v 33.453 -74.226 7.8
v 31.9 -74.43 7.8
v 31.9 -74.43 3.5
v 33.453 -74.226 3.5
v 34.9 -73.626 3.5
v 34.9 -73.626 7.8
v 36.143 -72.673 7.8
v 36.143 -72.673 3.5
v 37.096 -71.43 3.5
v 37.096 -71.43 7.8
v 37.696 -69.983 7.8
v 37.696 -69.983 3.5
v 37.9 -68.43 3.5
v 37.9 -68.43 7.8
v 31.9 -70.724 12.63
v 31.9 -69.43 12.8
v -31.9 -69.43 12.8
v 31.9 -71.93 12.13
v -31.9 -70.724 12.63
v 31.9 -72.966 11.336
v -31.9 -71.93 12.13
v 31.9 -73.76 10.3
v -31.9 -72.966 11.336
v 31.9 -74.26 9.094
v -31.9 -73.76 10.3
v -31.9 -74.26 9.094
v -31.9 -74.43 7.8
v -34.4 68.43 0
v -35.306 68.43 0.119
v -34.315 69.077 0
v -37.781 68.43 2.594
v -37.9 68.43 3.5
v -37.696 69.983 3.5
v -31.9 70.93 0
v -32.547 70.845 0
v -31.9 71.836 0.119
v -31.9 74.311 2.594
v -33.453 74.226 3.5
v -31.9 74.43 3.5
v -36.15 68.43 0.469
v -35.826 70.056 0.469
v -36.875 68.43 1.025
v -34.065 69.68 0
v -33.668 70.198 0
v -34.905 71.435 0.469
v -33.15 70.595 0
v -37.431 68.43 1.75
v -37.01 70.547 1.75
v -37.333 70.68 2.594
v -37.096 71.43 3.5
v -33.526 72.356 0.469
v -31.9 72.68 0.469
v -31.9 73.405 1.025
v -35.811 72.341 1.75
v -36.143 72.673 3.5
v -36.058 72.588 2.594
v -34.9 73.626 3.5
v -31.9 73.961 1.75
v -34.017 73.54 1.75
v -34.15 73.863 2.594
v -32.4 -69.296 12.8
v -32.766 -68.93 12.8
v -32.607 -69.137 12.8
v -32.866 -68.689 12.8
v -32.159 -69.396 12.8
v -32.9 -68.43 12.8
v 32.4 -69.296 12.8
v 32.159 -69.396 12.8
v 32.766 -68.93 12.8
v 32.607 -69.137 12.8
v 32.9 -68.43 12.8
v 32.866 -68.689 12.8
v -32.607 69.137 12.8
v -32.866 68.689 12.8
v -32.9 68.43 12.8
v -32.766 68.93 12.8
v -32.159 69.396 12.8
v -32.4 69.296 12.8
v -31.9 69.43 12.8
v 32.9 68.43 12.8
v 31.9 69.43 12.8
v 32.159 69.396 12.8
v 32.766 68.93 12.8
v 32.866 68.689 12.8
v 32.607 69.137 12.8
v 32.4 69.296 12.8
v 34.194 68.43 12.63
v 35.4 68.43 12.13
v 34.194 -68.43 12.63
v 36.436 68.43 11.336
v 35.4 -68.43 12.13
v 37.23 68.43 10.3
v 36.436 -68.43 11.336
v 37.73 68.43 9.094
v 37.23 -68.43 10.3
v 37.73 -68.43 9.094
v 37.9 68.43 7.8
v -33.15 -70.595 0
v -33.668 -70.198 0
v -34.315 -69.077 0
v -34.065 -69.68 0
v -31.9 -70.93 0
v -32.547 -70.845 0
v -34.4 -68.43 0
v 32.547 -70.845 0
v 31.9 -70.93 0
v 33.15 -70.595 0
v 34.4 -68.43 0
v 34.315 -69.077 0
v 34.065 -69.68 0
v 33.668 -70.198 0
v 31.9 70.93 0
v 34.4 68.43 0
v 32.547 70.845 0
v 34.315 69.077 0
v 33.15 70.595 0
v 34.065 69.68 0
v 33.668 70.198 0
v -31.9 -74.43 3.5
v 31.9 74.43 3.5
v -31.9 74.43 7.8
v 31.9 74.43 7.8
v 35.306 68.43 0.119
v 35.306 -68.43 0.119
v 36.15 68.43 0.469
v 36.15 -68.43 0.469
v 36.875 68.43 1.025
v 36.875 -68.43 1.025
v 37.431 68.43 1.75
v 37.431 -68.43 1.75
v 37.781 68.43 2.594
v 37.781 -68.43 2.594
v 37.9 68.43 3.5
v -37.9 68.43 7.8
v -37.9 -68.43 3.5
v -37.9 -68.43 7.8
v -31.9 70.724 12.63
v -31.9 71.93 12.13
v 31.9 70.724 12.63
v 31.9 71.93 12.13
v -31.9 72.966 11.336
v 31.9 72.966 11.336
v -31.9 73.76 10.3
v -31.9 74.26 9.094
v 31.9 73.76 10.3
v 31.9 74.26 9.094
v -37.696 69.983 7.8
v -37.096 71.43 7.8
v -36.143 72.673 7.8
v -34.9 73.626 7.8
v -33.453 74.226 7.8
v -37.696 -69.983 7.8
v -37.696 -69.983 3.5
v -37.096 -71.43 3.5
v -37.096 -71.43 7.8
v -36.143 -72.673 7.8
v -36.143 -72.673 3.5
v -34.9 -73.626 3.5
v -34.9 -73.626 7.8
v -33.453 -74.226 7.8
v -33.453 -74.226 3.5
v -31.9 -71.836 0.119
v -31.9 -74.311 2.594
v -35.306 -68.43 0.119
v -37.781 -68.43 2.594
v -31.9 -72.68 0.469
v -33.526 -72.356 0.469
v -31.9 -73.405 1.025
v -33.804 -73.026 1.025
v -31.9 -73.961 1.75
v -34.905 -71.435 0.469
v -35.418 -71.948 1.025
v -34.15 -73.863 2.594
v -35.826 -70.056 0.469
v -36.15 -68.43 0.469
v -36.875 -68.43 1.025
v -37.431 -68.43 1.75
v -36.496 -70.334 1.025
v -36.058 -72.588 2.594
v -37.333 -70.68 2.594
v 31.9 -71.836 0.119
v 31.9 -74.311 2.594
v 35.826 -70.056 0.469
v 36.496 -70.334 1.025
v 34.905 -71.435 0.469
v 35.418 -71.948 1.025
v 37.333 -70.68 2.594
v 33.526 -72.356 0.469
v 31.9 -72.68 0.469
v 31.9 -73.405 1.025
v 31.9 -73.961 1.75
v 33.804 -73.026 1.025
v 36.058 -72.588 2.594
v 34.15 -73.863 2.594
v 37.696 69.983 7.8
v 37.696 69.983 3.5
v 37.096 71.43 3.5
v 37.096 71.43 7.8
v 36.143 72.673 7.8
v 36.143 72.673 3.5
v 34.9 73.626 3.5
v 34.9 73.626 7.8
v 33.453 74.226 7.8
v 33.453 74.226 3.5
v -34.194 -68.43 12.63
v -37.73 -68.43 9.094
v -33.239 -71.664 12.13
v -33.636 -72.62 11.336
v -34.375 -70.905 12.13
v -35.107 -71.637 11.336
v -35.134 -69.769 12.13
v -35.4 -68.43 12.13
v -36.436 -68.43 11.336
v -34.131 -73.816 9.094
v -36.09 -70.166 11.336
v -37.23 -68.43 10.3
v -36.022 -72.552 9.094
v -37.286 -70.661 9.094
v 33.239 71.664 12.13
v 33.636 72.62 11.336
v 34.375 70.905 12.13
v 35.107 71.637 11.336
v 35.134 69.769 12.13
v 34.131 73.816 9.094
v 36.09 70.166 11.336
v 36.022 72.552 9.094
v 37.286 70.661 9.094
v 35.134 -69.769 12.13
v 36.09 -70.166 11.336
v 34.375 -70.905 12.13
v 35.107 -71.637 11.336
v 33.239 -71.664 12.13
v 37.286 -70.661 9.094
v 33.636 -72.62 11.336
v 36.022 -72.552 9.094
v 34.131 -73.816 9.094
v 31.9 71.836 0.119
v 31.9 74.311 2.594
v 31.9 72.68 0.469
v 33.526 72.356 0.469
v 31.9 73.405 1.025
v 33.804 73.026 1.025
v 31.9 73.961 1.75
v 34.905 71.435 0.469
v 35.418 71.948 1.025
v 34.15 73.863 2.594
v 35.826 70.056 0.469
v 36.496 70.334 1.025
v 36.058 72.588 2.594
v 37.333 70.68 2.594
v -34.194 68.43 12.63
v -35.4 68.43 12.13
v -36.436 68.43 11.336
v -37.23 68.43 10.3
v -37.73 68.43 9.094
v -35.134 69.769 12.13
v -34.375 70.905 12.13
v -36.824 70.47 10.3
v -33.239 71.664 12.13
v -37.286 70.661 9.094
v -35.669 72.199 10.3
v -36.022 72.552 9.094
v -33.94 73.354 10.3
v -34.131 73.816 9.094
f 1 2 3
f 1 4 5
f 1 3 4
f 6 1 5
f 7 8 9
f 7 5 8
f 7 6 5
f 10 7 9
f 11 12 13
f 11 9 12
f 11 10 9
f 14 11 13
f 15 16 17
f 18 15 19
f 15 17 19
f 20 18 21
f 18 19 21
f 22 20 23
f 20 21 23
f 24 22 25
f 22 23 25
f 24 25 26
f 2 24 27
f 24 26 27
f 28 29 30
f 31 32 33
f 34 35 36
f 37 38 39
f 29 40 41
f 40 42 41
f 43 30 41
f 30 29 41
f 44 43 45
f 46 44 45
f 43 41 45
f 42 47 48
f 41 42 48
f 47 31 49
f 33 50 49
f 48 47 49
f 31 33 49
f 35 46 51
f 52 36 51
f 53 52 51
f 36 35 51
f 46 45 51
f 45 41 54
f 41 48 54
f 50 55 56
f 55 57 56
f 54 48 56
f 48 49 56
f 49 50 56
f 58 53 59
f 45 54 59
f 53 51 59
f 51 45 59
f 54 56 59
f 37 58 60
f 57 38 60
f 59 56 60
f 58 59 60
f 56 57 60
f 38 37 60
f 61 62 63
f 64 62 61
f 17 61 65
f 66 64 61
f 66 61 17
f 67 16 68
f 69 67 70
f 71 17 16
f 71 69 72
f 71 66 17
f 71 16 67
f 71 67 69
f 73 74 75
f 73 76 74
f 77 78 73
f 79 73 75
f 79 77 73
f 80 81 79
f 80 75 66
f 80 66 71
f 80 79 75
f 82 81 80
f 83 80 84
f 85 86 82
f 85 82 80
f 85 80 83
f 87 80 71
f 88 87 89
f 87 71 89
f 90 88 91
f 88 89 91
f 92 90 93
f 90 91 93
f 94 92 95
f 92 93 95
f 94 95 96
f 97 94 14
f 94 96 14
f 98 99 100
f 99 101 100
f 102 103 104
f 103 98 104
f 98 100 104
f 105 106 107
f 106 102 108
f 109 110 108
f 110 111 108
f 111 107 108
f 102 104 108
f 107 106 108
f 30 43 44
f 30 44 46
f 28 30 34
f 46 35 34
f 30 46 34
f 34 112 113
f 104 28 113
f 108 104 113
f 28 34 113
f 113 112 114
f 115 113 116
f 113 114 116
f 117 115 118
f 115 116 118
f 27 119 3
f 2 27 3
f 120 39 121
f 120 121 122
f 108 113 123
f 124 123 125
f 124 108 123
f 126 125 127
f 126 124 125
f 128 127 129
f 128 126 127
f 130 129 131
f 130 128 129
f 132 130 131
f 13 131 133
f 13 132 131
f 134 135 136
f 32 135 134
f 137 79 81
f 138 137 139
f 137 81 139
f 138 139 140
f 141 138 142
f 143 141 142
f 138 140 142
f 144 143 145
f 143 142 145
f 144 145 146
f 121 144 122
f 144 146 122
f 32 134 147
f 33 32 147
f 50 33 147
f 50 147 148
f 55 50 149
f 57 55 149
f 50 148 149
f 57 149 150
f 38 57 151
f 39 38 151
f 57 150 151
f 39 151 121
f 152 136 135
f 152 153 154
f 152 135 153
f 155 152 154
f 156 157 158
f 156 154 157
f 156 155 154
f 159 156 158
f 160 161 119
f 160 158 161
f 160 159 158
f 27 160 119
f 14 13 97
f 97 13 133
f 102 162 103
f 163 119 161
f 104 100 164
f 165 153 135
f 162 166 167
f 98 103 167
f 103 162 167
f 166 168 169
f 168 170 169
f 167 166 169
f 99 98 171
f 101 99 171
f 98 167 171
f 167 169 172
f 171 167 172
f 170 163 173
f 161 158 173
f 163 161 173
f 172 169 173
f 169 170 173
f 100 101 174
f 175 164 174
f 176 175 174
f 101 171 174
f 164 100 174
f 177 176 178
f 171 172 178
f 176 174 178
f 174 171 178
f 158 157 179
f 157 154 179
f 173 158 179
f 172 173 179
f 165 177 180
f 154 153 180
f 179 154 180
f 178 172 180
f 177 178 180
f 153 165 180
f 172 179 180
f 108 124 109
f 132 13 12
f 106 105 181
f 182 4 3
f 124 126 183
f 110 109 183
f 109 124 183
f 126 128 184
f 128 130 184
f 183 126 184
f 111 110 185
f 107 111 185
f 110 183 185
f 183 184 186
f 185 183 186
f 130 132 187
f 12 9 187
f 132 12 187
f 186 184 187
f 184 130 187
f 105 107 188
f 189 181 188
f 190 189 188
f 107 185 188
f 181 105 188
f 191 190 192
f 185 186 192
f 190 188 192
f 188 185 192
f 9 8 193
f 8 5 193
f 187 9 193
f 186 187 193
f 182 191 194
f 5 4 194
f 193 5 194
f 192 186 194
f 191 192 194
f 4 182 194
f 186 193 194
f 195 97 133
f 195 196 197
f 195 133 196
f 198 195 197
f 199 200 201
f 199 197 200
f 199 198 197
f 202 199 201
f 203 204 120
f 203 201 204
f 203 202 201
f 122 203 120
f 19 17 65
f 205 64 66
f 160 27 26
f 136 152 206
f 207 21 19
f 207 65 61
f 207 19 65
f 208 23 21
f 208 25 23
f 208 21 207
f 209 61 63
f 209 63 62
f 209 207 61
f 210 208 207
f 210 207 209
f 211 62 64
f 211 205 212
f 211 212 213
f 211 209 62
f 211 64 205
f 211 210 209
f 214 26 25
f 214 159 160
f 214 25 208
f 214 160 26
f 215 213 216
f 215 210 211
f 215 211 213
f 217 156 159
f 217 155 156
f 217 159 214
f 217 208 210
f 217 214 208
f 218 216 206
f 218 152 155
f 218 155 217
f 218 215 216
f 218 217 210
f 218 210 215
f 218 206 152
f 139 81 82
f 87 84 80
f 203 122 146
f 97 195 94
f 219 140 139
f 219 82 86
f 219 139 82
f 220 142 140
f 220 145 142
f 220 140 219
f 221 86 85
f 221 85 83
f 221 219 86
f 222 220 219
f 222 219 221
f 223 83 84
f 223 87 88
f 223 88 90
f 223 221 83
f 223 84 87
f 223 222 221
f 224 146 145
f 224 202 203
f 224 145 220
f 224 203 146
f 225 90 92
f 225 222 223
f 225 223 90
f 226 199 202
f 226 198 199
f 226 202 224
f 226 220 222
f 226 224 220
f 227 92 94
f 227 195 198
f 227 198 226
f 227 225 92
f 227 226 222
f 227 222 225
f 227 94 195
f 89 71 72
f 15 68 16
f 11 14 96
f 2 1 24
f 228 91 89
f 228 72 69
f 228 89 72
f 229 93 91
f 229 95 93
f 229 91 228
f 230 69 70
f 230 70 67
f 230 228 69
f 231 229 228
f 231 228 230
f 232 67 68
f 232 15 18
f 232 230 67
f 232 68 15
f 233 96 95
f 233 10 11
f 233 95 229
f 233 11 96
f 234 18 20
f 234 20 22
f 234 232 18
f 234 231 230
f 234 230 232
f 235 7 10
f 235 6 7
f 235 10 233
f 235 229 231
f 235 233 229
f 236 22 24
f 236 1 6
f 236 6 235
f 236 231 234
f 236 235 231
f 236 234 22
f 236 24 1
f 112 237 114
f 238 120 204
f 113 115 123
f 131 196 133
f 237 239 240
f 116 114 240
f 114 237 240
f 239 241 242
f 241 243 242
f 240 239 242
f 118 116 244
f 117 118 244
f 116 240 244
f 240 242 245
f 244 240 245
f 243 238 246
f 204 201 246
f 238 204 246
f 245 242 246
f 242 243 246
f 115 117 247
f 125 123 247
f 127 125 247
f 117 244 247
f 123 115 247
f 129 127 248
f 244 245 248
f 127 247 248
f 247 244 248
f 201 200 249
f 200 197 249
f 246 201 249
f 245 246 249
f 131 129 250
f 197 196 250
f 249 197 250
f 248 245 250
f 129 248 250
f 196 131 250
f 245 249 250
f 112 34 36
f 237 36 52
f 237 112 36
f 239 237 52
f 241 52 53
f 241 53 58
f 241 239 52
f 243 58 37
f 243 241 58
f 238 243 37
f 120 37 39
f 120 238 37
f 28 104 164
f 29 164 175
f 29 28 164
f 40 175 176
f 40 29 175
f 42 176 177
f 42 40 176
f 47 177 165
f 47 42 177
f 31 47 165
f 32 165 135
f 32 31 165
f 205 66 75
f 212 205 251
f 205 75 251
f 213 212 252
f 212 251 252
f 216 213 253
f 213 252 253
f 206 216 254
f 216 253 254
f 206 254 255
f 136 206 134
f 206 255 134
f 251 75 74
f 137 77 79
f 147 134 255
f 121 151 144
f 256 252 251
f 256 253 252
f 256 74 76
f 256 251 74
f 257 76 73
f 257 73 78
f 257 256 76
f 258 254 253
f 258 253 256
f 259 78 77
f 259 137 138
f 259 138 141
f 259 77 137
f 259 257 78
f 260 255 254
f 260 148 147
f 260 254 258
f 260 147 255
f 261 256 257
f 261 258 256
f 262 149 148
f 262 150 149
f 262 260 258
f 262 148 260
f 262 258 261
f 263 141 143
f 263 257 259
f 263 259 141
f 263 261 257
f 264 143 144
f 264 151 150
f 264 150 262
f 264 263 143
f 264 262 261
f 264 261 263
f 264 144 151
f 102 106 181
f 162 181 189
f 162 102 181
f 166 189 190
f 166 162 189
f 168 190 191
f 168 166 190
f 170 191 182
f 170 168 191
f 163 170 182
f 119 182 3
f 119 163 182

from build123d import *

# Parameters (mm, degrees)
F0_W     = 75.8
F0_H     = 148.86
F1_DEPTH = 12.8
F2_R     = 6
F3_R     = 3.5
F4_R     = 5


with BuildPart() as f1:
    # F0 (on Top) → F1 (new body)
    with BuildSketch(Plane.XY):
        Rectangle(F0_W, F0_H)
    extrude(amount=F1_DEPTH)

    # F2
    f2_edges = [f1.edges().sort_by_distance(p)[0] for p in [
        (37.9, 74.43, 6.4),
        (-37.9, 74.43, 6.4),
        (-37.9, -74.43, 6.4),
        (37.9, -74.43, 6.4),
    ]]
    fillet(f2_edges, radius=F2_R)

    # F3
    f3_edges = [f1.edges().sort_by_distance(p)[0] for p in [
        (0, 74.43, 0),
    ]]
    fillet(f3_edges, radius=F3_R)

    # F4
    f4_edges = [f1.edges().sort_by_distance(p)[0] for p in [
        (0, 74.43, 12.8),
    ]]
    fillet(f4_edges, radius=F4_R)


solid = f1.part
